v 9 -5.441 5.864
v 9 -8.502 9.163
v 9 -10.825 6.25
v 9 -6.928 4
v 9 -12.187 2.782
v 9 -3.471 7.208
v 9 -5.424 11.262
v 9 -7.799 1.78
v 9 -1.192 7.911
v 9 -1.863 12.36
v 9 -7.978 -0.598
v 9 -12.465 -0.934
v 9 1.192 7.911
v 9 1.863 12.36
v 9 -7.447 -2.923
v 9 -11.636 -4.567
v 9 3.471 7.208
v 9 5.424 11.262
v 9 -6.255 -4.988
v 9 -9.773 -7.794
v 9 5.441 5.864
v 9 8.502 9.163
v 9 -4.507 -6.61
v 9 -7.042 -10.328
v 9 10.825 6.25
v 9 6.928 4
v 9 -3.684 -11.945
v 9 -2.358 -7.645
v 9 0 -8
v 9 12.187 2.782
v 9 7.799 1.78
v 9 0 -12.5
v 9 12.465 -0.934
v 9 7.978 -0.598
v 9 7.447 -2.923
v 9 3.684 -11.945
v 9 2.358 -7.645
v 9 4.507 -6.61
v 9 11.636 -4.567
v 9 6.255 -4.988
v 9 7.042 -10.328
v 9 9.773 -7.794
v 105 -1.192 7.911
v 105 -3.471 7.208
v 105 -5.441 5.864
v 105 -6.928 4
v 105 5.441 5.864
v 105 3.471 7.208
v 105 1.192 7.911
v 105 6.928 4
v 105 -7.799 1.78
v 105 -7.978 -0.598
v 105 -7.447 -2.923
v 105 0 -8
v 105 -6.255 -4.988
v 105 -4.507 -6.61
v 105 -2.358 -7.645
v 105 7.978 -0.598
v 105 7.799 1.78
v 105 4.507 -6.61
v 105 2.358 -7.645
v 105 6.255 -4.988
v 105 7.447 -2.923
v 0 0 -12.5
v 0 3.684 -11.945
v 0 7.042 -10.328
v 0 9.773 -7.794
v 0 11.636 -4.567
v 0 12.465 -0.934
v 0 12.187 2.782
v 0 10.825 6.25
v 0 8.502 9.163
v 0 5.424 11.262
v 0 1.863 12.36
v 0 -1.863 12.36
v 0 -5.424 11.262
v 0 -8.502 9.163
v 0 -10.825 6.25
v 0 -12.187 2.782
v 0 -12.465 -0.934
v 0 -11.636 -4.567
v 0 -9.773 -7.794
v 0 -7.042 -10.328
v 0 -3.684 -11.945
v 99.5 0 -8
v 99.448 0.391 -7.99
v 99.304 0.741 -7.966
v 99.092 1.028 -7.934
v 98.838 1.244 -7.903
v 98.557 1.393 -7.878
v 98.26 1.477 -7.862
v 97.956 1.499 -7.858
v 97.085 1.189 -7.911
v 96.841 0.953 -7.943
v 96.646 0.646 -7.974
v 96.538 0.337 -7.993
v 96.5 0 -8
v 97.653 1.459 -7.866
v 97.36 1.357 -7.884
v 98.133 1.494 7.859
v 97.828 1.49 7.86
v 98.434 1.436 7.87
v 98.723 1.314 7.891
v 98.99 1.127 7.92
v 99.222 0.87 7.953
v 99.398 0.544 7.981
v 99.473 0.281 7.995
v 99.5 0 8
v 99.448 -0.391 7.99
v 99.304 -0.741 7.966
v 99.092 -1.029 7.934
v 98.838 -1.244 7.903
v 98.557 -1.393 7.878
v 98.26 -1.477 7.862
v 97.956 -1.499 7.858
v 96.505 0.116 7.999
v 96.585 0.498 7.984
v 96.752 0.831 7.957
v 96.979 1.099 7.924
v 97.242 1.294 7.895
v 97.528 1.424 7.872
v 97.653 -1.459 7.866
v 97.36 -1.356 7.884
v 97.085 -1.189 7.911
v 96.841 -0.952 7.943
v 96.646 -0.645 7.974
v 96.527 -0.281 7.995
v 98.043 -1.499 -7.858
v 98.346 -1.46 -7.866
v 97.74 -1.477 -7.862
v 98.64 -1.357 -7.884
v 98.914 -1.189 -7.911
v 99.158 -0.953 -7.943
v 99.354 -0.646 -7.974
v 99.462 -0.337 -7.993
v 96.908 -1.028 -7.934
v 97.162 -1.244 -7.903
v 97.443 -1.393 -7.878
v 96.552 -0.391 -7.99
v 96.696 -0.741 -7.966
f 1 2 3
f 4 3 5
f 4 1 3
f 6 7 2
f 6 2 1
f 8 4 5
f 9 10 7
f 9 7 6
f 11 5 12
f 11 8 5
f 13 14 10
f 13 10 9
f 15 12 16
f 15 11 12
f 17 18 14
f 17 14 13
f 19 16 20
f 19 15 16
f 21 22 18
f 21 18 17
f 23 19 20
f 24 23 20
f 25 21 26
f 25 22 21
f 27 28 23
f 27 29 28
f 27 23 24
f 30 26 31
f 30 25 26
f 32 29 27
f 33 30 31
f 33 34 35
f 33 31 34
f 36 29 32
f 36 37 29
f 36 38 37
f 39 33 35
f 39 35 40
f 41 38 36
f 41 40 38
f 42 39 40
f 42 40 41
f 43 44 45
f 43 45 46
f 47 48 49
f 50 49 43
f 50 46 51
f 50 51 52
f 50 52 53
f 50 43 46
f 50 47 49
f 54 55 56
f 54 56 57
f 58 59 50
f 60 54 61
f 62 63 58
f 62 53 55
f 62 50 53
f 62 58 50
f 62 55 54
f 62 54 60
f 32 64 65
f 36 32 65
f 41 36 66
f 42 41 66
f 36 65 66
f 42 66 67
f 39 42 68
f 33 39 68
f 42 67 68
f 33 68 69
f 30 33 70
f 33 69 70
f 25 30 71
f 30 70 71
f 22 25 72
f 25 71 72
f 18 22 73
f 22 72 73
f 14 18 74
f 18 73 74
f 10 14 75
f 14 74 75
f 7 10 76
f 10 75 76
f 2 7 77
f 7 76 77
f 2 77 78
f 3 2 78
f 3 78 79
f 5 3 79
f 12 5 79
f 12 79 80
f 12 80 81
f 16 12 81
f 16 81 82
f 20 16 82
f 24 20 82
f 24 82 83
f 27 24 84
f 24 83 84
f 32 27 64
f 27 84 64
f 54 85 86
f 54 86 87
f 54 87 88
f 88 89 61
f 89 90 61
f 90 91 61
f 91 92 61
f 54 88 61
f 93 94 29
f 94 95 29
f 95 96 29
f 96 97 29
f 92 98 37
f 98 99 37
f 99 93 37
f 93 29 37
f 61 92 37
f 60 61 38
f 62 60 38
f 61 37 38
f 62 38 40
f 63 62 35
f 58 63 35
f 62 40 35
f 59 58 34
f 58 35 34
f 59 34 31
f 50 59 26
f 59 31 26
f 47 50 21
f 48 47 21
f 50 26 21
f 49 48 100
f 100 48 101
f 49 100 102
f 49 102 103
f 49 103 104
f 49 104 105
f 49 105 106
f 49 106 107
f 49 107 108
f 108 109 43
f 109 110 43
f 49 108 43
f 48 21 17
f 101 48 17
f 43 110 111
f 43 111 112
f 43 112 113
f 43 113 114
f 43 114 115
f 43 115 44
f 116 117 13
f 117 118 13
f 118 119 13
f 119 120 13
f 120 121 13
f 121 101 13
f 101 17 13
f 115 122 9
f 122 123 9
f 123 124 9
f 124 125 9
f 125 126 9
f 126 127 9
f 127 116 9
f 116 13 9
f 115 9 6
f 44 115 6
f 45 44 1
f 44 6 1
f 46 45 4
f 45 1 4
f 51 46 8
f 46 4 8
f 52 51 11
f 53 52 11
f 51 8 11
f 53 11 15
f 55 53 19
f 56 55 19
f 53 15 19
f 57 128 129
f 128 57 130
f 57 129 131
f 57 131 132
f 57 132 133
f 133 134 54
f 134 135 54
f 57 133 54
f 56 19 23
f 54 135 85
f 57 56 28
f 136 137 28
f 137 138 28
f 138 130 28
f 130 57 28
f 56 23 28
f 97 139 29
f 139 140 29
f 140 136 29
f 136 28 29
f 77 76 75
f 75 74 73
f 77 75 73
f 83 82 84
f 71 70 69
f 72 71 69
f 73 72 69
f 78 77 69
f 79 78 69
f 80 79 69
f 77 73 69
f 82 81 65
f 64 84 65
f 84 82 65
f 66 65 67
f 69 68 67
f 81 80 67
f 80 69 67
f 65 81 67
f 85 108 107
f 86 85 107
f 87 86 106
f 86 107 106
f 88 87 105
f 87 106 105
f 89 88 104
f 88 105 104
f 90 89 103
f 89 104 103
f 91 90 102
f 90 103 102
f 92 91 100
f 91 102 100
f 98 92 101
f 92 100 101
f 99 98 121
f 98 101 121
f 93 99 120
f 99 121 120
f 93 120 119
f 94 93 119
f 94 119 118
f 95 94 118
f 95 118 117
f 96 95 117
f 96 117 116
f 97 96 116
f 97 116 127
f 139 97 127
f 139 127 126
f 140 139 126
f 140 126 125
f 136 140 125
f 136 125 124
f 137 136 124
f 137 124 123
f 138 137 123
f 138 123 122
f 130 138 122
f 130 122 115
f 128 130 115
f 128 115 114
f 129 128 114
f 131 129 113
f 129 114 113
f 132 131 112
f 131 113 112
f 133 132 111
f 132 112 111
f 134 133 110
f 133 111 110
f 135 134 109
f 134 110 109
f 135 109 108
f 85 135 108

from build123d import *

# Parameters (mm, degrees)
SKETCH1_R           = 12.5
BOSS_EXTRUDE1_DEPTH = 9
SKETCH2_R           = 8
BOSS_EXTRUDE2_DEPTH = 96
SKETCH4_R           = 1.5
CUT_EXTRUDE1_DEPTH  = 96


with BuildPart() as part:
    # Sketch1 → Boss-Extrude1 (new body)
    with BuildSketch(Plane(origin=(0, 0, 0), x_dir=(0, 0, -1), z_dir=(1, 0, 0))):
        Circle(SKETCH1_R)
    extrude(amount=BOSS_EXTRUDE1_DEPTH)

    # Sketch2 → Boss-Extrude2 (add)
    with BuildSketch(Plane(origin=(9, 0, 0), x_dir=(0, 0, -1), z_dir=(1, 0, 0))):
        Circle(SKETCH2_R)
    extrude(amount=BOSS_EXTRUDE2_DEPTH)

    # Sketch4 → Cut-Extrude1 (cut)
    with BuildSketch(Plane.XY.offset(8)):
        with Locations((98, 0)):
            Circle(SKETCH4_R)
    extrude(amount=-CUT_EXTRUDE1_DEPTH, mode=Mode.SUBTRACT)


solid = part.part
